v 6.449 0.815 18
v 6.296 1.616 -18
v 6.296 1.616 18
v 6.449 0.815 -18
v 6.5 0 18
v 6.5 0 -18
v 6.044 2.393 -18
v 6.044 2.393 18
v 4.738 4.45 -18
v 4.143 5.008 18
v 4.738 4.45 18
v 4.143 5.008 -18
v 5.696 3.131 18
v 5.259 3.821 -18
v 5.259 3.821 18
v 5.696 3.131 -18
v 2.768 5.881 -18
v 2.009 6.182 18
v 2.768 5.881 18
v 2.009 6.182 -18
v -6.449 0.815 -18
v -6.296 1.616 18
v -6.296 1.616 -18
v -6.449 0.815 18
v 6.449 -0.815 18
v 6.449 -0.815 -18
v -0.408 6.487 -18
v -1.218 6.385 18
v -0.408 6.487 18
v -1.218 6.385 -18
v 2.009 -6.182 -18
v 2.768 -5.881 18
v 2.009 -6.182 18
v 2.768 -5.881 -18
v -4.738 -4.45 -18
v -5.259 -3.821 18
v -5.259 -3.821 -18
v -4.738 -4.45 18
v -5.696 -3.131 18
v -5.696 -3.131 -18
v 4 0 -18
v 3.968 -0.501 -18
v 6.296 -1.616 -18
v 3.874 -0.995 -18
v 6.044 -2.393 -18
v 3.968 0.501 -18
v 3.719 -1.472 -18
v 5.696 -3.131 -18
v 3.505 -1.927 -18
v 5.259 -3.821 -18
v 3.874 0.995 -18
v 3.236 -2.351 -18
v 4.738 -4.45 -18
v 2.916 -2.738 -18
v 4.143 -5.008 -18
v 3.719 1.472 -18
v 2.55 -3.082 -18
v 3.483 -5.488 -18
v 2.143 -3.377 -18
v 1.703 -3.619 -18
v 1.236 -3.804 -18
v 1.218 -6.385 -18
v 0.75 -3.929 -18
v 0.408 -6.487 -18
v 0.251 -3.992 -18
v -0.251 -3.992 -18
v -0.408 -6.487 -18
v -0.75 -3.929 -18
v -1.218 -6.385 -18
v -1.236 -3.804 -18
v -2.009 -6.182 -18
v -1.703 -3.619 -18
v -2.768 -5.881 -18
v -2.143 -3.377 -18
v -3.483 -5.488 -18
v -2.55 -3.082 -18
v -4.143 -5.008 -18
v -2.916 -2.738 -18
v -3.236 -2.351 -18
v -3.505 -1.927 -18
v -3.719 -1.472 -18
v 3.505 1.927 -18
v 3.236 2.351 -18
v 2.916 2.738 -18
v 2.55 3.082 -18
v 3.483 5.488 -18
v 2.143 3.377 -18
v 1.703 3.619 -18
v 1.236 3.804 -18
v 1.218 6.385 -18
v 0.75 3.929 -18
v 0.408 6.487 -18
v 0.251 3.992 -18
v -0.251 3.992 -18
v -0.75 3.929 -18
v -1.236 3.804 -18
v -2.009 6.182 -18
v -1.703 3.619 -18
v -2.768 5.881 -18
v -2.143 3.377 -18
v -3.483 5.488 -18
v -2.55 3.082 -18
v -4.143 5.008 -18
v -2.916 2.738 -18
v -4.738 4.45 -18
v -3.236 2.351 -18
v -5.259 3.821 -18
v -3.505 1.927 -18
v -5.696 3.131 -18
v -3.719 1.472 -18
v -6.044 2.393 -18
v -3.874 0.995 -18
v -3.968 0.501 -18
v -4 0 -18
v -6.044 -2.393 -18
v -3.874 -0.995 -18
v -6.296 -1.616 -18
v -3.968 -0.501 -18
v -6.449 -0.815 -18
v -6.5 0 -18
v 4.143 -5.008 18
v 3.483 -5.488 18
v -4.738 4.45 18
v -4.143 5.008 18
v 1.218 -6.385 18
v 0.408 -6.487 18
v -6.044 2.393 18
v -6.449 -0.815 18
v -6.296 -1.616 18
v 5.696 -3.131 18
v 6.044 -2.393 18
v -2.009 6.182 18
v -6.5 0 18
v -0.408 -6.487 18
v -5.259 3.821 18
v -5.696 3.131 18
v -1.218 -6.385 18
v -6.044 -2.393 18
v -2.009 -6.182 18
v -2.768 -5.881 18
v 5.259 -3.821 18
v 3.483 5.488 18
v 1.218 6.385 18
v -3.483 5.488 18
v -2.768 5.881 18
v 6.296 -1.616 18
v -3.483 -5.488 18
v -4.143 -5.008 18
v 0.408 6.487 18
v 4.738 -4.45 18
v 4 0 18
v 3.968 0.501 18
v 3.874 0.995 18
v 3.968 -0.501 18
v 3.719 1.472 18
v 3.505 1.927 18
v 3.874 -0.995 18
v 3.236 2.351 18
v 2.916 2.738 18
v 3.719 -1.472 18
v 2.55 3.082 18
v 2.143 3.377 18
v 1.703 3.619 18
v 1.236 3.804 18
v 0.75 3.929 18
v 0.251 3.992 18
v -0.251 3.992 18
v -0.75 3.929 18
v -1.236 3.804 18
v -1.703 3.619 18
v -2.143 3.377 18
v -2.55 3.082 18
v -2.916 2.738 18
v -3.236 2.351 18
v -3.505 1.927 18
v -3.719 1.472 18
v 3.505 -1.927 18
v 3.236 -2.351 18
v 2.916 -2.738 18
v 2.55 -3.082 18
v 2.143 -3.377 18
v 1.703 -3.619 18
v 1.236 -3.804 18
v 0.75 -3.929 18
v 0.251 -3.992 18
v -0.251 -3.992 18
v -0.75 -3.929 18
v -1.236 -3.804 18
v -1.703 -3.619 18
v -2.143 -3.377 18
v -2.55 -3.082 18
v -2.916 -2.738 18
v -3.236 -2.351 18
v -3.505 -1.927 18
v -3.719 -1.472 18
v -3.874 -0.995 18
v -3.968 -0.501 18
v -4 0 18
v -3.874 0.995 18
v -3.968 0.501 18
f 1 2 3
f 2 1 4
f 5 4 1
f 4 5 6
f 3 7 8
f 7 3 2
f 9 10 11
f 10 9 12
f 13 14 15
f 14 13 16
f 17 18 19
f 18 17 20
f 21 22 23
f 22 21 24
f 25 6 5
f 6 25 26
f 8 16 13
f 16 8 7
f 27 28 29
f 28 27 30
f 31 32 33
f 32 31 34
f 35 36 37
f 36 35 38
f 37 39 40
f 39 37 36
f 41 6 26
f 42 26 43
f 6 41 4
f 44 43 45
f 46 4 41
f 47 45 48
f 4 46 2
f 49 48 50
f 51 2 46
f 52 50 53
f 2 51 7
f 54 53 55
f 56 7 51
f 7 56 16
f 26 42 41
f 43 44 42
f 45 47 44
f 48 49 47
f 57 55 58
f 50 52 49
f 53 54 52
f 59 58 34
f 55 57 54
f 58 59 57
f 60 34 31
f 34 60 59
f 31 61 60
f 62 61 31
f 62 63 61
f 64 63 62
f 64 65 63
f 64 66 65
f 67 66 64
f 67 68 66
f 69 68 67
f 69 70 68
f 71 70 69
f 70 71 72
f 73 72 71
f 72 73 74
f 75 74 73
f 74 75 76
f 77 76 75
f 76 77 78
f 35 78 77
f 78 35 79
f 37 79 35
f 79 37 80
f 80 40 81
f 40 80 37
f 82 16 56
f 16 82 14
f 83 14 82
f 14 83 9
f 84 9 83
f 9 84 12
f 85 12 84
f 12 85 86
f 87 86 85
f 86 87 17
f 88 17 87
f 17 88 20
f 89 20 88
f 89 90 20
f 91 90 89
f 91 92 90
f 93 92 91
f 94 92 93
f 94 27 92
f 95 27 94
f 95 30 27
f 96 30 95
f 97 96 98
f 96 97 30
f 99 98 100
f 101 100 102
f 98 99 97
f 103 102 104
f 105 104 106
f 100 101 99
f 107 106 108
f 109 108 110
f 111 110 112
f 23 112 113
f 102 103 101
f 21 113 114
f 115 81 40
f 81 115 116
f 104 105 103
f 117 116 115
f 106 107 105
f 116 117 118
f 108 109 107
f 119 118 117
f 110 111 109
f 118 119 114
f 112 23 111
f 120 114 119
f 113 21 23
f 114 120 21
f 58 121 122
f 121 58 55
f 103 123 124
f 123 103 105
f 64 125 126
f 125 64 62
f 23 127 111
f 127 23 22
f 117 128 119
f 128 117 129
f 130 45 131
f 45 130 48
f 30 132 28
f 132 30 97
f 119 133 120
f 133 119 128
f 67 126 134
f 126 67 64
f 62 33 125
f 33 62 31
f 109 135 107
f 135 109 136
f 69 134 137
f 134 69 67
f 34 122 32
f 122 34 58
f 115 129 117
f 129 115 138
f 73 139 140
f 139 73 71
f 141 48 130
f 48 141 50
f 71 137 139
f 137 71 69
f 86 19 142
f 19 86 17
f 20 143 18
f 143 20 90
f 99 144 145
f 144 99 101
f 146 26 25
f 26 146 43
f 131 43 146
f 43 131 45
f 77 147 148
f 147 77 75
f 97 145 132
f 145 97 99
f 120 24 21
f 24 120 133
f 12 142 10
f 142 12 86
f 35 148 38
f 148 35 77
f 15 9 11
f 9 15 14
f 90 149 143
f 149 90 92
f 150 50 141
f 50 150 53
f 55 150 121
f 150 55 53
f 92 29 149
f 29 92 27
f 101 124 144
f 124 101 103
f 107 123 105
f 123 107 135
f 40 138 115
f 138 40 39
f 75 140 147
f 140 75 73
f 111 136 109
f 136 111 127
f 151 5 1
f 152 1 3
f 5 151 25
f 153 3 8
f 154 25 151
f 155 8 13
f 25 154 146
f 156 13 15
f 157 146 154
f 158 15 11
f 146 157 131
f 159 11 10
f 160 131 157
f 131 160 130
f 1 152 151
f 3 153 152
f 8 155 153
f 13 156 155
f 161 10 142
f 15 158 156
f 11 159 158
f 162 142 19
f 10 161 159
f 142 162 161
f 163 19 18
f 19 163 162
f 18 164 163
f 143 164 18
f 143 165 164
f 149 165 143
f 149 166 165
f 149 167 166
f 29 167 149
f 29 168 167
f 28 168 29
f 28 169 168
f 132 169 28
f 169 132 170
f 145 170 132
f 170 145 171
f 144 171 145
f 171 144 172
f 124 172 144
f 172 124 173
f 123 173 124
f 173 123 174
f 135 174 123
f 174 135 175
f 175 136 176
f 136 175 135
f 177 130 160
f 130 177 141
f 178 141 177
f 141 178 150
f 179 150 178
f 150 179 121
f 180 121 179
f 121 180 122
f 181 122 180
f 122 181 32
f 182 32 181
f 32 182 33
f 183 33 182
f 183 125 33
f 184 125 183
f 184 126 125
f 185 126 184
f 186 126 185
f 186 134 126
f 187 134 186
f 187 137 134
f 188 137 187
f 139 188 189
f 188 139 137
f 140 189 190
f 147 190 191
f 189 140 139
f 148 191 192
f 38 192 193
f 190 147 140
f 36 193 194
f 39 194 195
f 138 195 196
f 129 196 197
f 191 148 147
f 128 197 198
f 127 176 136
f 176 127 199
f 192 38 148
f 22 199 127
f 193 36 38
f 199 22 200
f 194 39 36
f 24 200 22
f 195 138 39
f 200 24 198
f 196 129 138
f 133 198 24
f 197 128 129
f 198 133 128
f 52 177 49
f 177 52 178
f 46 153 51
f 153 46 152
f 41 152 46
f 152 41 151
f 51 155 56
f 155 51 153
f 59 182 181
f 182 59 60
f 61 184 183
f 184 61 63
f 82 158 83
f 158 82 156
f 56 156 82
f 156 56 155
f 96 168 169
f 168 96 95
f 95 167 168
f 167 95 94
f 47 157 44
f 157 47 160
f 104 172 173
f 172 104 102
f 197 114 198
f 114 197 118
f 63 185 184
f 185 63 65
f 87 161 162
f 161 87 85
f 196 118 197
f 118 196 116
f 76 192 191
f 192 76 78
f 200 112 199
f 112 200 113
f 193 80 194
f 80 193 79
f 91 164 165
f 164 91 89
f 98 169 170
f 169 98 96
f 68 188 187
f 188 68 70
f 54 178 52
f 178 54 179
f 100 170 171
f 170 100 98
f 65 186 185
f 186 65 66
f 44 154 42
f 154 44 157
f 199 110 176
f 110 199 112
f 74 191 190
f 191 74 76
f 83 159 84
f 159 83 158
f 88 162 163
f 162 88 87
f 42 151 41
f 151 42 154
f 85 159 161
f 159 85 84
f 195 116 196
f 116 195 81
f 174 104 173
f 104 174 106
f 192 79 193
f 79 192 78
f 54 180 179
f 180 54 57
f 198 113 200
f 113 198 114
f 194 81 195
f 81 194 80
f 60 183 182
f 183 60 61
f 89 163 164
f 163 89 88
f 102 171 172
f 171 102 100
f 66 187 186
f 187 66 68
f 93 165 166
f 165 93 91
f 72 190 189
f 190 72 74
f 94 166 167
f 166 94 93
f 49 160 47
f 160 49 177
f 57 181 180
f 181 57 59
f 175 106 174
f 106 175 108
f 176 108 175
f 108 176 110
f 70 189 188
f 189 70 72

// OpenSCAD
$fn = 50;


difference() {
	union() {
		translate(v = [0, 0, -18.0000000000]) {
			cylinder(h = 36, r = 6.5000000000);
		}
	}
	union() {
		translate(v = [0, 0, -100.0000000000]) {
			cylinder(h = 200, r = 4.0000000000);
		}
	}
}
